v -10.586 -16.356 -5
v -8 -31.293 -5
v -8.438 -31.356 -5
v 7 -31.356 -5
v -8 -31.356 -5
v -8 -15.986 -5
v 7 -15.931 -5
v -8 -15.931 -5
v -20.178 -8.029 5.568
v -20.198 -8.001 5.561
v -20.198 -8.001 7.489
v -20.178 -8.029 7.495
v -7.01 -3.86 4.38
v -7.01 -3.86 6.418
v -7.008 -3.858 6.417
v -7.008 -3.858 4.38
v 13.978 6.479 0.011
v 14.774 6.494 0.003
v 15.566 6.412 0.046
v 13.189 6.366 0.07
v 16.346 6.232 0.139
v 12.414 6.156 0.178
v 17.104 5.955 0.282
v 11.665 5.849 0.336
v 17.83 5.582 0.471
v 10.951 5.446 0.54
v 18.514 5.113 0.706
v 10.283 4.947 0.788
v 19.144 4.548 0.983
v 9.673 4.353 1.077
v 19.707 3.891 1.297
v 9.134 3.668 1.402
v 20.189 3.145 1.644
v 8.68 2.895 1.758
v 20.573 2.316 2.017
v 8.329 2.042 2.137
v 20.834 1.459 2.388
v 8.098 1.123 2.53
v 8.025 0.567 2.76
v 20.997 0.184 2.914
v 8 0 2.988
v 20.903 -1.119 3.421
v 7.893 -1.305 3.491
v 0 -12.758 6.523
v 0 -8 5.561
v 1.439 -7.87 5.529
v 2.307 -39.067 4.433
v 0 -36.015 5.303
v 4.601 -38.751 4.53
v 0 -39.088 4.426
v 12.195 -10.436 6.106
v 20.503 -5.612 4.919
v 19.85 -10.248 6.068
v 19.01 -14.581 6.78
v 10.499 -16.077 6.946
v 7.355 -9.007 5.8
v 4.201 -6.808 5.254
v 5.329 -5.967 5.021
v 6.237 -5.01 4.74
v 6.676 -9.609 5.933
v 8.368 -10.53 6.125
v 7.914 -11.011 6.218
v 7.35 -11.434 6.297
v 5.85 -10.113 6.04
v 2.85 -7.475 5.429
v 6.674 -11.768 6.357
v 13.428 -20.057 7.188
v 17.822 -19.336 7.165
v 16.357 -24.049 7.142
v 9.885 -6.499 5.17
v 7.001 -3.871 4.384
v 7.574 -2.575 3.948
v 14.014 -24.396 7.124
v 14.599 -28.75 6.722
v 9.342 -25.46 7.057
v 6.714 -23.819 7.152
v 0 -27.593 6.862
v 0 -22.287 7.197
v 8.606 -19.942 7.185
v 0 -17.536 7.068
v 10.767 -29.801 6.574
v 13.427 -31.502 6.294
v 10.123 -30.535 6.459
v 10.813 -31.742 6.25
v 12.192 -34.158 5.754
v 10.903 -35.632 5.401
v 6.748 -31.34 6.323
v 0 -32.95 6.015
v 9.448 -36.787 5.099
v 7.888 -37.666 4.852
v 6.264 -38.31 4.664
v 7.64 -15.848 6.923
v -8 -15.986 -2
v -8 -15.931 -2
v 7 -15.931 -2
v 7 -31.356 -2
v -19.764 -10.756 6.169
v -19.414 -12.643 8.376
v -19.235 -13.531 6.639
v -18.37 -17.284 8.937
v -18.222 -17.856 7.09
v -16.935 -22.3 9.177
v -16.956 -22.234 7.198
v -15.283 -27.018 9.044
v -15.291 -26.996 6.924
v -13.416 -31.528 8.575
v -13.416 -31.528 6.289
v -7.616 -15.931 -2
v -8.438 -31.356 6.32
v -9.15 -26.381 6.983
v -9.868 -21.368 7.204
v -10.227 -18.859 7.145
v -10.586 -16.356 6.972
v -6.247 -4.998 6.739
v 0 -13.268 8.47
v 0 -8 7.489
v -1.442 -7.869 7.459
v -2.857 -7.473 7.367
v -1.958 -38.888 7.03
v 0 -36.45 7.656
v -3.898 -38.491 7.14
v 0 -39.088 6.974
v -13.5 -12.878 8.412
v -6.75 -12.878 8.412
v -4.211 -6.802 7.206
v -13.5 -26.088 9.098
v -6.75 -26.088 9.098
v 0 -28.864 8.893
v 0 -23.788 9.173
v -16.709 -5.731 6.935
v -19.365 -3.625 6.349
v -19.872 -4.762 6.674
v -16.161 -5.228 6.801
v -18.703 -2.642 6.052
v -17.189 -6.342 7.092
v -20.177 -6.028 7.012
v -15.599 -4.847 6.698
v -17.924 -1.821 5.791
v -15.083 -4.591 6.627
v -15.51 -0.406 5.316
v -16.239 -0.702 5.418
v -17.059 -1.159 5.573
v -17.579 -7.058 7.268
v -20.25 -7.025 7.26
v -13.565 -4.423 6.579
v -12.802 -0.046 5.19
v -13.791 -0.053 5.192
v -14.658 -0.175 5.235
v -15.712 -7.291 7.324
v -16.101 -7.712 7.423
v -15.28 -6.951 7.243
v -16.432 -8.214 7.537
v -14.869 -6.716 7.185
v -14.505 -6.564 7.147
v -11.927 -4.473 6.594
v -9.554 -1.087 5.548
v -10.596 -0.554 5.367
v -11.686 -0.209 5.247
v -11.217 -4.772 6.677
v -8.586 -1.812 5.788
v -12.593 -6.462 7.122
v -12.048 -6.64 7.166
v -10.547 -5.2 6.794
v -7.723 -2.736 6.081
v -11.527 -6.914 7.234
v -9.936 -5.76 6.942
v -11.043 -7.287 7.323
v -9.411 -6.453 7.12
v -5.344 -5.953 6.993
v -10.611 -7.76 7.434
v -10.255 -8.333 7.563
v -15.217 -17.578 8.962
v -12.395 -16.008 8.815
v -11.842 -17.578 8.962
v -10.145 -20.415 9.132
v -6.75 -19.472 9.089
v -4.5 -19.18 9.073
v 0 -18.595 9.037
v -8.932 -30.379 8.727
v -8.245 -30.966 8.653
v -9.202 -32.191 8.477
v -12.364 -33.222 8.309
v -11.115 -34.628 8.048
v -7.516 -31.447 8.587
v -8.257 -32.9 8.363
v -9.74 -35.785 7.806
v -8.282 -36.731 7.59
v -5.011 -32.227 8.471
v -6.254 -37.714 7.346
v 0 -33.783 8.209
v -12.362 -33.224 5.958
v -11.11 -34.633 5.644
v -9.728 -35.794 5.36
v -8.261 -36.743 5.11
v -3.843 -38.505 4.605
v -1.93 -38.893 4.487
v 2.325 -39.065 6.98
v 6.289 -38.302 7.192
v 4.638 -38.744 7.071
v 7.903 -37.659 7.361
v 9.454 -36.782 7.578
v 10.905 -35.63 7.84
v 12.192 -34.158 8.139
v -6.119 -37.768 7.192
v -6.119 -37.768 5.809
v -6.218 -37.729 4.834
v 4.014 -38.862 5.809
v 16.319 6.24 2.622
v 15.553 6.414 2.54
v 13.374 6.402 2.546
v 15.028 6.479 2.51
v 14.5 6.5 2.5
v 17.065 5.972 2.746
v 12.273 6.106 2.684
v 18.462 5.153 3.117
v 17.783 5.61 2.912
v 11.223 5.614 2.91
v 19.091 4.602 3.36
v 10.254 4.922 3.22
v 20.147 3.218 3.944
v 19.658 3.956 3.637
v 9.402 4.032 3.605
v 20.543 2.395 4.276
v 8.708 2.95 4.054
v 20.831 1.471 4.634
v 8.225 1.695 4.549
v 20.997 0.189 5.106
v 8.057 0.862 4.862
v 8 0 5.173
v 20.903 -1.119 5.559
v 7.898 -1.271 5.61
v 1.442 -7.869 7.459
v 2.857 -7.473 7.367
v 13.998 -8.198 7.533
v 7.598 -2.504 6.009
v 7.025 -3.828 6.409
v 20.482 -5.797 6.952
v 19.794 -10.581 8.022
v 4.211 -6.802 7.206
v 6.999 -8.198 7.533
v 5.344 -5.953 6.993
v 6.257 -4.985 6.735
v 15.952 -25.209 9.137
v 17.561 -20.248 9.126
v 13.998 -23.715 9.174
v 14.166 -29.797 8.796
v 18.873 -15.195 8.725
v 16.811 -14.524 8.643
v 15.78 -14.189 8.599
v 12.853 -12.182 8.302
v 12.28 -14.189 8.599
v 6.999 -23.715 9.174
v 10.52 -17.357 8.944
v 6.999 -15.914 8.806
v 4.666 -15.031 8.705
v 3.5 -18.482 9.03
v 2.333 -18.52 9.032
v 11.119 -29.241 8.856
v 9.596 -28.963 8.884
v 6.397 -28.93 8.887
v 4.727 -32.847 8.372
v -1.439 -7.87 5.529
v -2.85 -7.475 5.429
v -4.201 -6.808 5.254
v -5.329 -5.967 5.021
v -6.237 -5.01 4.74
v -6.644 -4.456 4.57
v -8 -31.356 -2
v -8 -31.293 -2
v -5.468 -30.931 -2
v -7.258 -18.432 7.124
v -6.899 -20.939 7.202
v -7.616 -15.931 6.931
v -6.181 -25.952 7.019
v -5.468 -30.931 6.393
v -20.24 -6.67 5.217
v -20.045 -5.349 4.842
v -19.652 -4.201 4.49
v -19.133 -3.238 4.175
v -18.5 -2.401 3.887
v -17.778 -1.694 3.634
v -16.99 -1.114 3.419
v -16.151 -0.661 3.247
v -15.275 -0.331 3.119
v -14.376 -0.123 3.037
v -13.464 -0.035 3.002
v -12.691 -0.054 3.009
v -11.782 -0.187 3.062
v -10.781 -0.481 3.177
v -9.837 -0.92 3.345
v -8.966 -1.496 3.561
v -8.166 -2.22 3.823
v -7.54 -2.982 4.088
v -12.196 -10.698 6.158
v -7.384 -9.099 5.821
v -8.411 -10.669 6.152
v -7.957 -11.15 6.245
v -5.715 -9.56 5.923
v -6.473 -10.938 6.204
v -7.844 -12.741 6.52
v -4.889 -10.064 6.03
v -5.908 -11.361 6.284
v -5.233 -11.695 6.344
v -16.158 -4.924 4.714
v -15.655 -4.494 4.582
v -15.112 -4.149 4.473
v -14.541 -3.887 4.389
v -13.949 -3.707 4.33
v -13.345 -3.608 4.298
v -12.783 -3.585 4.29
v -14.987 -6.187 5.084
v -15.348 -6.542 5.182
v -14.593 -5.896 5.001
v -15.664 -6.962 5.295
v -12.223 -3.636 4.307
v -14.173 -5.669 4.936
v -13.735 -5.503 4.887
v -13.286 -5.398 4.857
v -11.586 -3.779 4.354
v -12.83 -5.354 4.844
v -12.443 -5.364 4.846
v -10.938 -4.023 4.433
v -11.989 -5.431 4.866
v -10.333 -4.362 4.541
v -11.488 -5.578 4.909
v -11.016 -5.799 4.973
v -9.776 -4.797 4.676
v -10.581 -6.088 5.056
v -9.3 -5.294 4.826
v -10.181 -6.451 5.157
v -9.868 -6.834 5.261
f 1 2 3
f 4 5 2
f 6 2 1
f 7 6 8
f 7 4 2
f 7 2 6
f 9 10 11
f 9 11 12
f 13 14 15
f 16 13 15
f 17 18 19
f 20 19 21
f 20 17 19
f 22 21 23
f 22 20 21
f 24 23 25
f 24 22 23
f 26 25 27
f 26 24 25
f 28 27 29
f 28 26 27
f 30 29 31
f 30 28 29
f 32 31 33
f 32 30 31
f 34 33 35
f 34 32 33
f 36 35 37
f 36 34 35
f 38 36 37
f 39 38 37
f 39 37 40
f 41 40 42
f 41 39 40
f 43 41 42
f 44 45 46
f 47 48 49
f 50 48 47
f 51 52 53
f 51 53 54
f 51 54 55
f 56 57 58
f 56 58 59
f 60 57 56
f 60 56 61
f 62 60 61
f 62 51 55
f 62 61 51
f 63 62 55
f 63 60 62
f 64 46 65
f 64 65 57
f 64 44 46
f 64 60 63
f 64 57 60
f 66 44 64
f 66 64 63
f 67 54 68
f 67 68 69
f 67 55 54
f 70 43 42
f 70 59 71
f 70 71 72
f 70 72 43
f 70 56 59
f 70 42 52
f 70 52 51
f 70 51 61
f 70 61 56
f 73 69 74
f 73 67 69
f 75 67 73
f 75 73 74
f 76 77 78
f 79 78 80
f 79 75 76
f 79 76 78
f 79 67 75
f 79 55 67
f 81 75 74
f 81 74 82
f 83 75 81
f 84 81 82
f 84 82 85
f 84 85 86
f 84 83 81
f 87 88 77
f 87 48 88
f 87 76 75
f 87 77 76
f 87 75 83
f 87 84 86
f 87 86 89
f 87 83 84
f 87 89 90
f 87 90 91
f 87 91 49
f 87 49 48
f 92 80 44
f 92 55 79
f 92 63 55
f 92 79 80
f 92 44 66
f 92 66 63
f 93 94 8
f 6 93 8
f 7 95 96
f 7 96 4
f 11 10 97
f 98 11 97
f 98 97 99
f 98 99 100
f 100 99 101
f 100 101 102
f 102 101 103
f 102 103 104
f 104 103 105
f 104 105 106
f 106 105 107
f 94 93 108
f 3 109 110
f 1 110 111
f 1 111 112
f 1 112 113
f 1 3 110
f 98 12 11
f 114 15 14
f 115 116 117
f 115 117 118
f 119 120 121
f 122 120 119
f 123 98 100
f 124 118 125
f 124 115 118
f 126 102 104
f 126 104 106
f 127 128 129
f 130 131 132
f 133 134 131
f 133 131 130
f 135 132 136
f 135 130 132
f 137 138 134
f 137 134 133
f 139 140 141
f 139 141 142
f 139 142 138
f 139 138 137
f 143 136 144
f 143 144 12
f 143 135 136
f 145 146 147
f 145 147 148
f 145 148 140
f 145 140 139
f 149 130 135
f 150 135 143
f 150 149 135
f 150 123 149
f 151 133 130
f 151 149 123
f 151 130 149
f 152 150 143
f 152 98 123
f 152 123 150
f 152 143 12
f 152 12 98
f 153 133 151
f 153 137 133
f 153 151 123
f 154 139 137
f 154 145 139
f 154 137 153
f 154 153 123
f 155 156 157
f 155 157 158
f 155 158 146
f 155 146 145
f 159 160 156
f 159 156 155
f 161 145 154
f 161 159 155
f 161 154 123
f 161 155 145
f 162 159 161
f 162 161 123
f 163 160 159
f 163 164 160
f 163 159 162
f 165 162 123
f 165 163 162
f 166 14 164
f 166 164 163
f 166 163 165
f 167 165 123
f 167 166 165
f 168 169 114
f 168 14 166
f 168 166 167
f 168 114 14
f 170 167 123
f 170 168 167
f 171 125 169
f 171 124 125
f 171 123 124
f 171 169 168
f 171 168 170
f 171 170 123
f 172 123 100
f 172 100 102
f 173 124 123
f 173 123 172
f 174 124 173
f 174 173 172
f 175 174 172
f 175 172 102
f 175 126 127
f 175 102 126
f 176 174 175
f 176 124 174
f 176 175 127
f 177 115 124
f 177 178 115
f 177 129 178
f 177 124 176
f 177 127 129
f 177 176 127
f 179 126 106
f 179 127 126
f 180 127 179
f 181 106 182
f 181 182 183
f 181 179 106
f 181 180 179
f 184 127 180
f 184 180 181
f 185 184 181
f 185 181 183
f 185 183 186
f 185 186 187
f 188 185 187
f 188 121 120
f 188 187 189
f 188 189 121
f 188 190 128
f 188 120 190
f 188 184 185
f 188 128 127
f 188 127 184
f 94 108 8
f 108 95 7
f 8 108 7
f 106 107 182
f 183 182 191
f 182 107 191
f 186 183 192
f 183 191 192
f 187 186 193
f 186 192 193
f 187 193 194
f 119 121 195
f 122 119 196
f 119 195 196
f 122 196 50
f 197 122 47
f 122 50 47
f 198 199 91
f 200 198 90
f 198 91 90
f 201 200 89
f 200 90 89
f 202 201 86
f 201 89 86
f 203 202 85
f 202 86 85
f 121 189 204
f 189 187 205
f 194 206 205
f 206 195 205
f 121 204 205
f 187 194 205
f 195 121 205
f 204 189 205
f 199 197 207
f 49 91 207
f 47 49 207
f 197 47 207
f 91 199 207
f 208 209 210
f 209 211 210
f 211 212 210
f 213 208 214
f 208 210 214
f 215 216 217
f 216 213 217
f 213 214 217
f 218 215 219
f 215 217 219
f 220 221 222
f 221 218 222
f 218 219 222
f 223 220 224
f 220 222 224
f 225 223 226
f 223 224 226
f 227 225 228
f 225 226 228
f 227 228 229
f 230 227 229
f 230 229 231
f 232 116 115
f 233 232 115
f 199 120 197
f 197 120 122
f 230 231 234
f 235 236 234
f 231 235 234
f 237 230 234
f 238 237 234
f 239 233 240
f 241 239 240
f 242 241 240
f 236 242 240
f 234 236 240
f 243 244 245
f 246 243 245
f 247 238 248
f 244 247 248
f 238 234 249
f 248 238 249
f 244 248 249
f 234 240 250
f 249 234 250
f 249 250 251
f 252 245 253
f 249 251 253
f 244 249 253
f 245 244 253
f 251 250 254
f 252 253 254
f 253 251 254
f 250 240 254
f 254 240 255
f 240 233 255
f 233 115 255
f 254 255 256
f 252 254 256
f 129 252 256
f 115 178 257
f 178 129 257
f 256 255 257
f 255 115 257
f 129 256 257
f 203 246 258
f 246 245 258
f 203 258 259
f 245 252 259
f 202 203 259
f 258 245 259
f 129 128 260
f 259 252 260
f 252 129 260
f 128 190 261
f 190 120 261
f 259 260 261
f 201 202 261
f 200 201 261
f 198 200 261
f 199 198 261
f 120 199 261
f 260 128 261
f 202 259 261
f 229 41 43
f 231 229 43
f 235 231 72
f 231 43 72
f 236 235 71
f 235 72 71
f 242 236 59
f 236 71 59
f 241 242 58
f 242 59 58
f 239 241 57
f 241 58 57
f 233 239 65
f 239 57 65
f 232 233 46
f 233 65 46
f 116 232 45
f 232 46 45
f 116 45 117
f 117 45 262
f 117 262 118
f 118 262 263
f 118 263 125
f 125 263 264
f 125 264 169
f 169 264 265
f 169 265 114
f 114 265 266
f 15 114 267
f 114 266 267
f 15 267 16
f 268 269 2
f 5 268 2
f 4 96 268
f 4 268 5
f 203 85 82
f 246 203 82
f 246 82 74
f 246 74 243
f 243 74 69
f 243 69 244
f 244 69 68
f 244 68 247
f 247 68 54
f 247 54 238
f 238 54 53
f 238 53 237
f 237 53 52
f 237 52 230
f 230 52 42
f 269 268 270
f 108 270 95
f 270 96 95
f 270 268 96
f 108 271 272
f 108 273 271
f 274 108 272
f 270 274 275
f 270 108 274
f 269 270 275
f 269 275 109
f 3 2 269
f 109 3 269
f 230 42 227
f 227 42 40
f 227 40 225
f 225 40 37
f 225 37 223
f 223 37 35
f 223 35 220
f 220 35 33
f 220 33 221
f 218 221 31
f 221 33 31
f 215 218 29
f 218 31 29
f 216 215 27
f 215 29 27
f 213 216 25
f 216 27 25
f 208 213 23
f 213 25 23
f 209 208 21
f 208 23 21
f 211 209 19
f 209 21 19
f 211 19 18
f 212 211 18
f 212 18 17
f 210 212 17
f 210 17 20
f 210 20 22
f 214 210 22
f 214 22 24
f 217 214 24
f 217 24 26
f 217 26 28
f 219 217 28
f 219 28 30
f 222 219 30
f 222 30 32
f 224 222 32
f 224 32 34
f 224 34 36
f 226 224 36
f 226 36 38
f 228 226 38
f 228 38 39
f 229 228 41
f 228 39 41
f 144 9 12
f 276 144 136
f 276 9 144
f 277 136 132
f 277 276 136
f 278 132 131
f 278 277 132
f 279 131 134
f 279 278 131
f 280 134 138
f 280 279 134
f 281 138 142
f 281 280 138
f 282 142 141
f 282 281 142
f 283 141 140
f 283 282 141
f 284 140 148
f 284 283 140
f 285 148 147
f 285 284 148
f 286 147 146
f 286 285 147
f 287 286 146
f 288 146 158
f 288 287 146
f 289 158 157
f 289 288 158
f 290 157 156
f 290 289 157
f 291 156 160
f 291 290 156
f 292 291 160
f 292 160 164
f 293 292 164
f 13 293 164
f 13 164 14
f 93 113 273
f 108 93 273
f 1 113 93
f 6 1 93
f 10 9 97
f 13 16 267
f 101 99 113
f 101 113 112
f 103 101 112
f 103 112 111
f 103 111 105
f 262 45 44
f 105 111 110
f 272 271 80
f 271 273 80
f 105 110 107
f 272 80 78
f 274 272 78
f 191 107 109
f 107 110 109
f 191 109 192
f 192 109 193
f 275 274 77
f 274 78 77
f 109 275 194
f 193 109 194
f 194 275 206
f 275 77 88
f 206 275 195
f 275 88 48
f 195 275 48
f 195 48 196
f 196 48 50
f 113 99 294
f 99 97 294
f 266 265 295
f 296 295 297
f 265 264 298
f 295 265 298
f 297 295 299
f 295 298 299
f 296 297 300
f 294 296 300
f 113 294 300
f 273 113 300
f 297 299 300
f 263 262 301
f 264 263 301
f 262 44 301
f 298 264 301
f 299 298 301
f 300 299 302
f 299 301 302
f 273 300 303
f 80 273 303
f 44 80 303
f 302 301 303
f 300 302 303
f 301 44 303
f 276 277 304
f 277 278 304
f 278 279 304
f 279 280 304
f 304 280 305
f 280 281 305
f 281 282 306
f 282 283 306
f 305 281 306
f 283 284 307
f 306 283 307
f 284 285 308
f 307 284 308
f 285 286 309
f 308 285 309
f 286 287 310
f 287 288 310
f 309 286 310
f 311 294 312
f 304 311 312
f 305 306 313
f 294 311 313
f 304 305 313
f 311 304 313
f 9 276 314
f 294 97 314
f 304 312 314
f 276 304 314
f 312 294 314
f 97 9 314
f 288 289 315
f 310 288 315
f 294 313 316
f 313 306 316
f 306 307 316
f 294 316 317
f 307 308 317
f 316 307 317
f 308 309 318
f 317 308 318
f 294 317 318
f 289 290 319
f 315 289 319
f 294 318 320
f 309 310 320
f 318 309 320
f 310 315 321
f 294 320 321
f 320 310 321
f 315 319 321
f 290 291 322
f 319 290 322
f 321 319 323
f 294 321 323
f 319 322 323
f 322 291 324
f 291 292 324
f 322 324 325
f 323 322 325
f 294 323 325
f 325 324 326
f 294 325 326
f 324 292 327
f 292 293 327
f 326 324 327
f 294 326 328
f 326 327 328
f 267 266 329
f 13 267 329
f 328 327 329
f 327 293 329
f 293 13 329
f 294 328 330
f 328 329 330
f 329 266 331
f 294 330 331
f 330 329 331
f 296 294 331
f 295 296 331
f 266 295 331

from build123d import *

# Parameters (mm, degrees)
BOSS_EXTRUDE1_DEPTH     = 10
SKETCH3_W               = 26.349262508
SKETCH3_H               = 68.843906453
CUT_EXTRUDE1_DEPTH      = 56.145262863
CUT_EXTRUDE1_DEPTH_BACK = 56.145262863
CUT_EXTRUDE2_DEPTH      = 56.002384149
CUT_EXTRUDE2_DEPTH_BACK = 56.002384149
CUT_EXTRUDE4_DEPTH      = 10
CUT_EXTRUDE5_DEPTH      = 46.333254596
CUT_EXTRUDE5_DEPTH_BACK = 46.333254596
BOSS_EXTRUDE2_START     = -5
BOSS_EXTRUDE2_DEPTH     = 13
BOSS_EXTRUDE4_START     = 7
SKETCH11_W              = 3
SKETCH11_H              = 15.425223653
BOSS_EXTRUDE4_DEPTH     = 15


with BuildPart() as part:
    # Sketch2 → Boss-Extrude1 (new body)
    with BuildSketch(Plane.XY):
        with BuildLine():
            ThreePointArc((20.902943543, -1.119068355), (15.061634654, 6.475690428), (8, 0))
            ThreePointArc((8, 0), (0, -8), (-8, 0))
            ThreePointArc((-8, 0), (-15.061634654, 6.475690428), (-20.902943543, -1.119068355))
            add(Edge.make_bspline(
                [(-20.902943543, -1.119068355), (-19.287028044, -26.367706227), (-3.931804619, -48.088836745)],
                knots=[0, 0, 0, 1, 1, 1], degree=2))
            ThreePointArc((-3.931804619, -48.088836745), (0, -50), (3.931804619, -48.088836745))
            add(Edge.make_bspline(
                [(3.931804619, -48.088836745), (19.287028044, -26.367706227), (20.902943543, -1.119068355)],
                knots=[0.990027735, 0.990027735, 0.990027735, 1.990027735, 1.990027735, 1.990027735], degree=2))
        make_face()
    extrude(amount=BOSS_EXTRUDE1_DEPTH)

    # Sketch3 → Cut-Extrude1 (cut, two sides)
    with BuildSketch(Plane(origin=(0, 0, 0), x_dir=(0, 0, -1), z_dir=(1, 0, 0))) as cut_extrude1_sk:
        with Locations((-0.626059786, -22.605093502)):
            Rectangle(SKETCH3_W, SKETCH3_H)
        with BuildLine():
            Line((-2.5, 6.5), (0, 6.5))
            add(Edge.make_bspline(
                [(0, 6.5), (-14.408545927, -21.081950651), (0, -50)],
                knots=[0, 0, 0, 1, 1, 1], degree=2))
            Line((0, -50), (-2.5, -50))
            add(Edge.make_bspline(
                [(-2.5, 6.5), (-10.733514135, -10.976620558), (-12.053907629, -32.649723791), (-2.5, -50)],
                knots=[0, 0, 0, 0, 1, 1, 1, 1], degree=3))
        make_face(mode=Mode.SUBTRACT)
    extrude(amount=CUT_EXTRUDE1_DEPTH, mode=Mode.SUBTRACT)
    extrude(cut_extrude1_sk.sketch, amount=-CUT_EXTRUDE1_DEPTH_BACK, mode=Mode.SUBTRACT)

    # Sketch6 → Cut-Extrude2 (cut, two sides)
    with BuildSketch(Plane.XY) as cut_extrude2_sk:
        with BuildLine():
            Line((-9.557408926, -39.200378686), (-14.826233878, -49.923840658))
            Line((-14.826233878, -49.923840658), (21.939629108, -53.600426957))
            Line((21.939629108, -53.600426957), (9.557408926, -39.200378686))
            add(Edge.make_bspline(
                [(-9.557408926, -39.200378686), (-5.942899698, -46.006320571), (5.857464148, -45.921239034), (9.557408926, -39.200378686)],
                knots=[0, 0, 0, 0, 1, 1, 1, 1], degree=3))
        make_face()
    extrude(amount=CUT_EXTRUDE2_DEPTH, mode=Mode.SUBTRACT)
    extrude(cut_extrude2_sk.sketch, amount=-CUT_EXTRUDE2_DEPTH_BACK, mode=Mode.SUBTRACT)

    # Sketch8 → Cut-Extrude4 (cut)
    with BuildSketch(Plane.XY):
        with BuildLine():
            Line((-13.816005164, -30.617040202), (-11.76409894, -45.724796066))
            Line((-11.76409894, -45.724796066), (9.724502839, -47.837234885))
            Line((9.724502839, -47.837234885), (13.816005164, -30.617040202))
            add(Edge.make_bspline(
                [(-13.816005164, -30.617040202), (-9.778124174, -41.160624176), (10.772333276, -42.703617762), (13.816005164, -30.617040202)],
                knots=[0, 0, 0, 0, 1, 1, 1, 1], degree=3))
        make_face()
    extrude(amount=CUT_EXTRUDE4_DEPTH, mode=Mode.SUBTRACT)

    # Sketch9 → Cut-Extrude5 (cut, two sides)
    with BuildSketch(Plane.XY) as cut_extrude5_sk:
        with BuildLine():
            Line((-28.08585552, 3.22203692), (-20.178308463, -8.029241074))
            ThreePointArc((-20.178308463, -8.029241074), (-15.362673917, -0.358132046), (-7.0095805, -3.859857359))
            Line((-7.0095805, -3.859857359), (-4.822672945, -1.298112458))
            Line((-4.822672945, -1.298112458), (-10.044224813, 8.365655178))
            Line((-10.044224813, 8.365655178), (-28.08585552, 3.22203692))
        make_face()
    extrude(amount=CUT_EXTRUDE5_DEPTH, mode=Mode.SUBTRACT)
    extrude(cut_extrude5_sk.sketch, amount=-CUT_EXTRUDE5_DEPTH_BACK, mode=Mode.SUBTRACT)

    # Sketch10 → Boss-Extrude2 (add)
    with BuildSketch(Plane.XY.offset(BOSS_EXTRUDE2_START)):
        Polygon((-7.615886076, -15.930661374), (-5.468083043, -30.930661374), (-8.437794283, -31.355885027), (-10.585597315, -16.355885027), align=None)
    extrude(amount=BOSS_EXTRUDE2_DEPTH)

    # Sketch11 → Boss-Extrude4 (add)
    with BuildSketch(Plane(origin=(0, 0, 0), x_dir=(0, 0, -1), z_dir=(1, 0, 0)).offset(BOSS_EXTRUDE4_START)):
        with Locations((3.5, -23.643273201)):
            Rectangle(SKETCH11_W, SKETCH11_H)
    extrude(amount=-BOSS_EXTRUDE4_DEPTH)


solid = part.part
